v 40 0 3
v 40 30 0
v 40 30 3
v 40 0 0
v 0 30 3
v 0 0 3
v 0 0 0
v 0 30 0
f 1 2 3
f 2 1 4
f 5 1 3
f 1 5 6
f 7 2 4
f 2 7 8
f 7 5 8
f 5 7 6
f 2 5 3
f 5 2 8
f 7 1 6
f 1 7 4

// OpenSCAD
 translate([0,20,0]) color([1,1,1]) cube([40,10,3]);
 translate([0,10,0]) color([0,0,1]) cube([40,10,3]);
 color([1,0,0]) cube([40,10,3]);
